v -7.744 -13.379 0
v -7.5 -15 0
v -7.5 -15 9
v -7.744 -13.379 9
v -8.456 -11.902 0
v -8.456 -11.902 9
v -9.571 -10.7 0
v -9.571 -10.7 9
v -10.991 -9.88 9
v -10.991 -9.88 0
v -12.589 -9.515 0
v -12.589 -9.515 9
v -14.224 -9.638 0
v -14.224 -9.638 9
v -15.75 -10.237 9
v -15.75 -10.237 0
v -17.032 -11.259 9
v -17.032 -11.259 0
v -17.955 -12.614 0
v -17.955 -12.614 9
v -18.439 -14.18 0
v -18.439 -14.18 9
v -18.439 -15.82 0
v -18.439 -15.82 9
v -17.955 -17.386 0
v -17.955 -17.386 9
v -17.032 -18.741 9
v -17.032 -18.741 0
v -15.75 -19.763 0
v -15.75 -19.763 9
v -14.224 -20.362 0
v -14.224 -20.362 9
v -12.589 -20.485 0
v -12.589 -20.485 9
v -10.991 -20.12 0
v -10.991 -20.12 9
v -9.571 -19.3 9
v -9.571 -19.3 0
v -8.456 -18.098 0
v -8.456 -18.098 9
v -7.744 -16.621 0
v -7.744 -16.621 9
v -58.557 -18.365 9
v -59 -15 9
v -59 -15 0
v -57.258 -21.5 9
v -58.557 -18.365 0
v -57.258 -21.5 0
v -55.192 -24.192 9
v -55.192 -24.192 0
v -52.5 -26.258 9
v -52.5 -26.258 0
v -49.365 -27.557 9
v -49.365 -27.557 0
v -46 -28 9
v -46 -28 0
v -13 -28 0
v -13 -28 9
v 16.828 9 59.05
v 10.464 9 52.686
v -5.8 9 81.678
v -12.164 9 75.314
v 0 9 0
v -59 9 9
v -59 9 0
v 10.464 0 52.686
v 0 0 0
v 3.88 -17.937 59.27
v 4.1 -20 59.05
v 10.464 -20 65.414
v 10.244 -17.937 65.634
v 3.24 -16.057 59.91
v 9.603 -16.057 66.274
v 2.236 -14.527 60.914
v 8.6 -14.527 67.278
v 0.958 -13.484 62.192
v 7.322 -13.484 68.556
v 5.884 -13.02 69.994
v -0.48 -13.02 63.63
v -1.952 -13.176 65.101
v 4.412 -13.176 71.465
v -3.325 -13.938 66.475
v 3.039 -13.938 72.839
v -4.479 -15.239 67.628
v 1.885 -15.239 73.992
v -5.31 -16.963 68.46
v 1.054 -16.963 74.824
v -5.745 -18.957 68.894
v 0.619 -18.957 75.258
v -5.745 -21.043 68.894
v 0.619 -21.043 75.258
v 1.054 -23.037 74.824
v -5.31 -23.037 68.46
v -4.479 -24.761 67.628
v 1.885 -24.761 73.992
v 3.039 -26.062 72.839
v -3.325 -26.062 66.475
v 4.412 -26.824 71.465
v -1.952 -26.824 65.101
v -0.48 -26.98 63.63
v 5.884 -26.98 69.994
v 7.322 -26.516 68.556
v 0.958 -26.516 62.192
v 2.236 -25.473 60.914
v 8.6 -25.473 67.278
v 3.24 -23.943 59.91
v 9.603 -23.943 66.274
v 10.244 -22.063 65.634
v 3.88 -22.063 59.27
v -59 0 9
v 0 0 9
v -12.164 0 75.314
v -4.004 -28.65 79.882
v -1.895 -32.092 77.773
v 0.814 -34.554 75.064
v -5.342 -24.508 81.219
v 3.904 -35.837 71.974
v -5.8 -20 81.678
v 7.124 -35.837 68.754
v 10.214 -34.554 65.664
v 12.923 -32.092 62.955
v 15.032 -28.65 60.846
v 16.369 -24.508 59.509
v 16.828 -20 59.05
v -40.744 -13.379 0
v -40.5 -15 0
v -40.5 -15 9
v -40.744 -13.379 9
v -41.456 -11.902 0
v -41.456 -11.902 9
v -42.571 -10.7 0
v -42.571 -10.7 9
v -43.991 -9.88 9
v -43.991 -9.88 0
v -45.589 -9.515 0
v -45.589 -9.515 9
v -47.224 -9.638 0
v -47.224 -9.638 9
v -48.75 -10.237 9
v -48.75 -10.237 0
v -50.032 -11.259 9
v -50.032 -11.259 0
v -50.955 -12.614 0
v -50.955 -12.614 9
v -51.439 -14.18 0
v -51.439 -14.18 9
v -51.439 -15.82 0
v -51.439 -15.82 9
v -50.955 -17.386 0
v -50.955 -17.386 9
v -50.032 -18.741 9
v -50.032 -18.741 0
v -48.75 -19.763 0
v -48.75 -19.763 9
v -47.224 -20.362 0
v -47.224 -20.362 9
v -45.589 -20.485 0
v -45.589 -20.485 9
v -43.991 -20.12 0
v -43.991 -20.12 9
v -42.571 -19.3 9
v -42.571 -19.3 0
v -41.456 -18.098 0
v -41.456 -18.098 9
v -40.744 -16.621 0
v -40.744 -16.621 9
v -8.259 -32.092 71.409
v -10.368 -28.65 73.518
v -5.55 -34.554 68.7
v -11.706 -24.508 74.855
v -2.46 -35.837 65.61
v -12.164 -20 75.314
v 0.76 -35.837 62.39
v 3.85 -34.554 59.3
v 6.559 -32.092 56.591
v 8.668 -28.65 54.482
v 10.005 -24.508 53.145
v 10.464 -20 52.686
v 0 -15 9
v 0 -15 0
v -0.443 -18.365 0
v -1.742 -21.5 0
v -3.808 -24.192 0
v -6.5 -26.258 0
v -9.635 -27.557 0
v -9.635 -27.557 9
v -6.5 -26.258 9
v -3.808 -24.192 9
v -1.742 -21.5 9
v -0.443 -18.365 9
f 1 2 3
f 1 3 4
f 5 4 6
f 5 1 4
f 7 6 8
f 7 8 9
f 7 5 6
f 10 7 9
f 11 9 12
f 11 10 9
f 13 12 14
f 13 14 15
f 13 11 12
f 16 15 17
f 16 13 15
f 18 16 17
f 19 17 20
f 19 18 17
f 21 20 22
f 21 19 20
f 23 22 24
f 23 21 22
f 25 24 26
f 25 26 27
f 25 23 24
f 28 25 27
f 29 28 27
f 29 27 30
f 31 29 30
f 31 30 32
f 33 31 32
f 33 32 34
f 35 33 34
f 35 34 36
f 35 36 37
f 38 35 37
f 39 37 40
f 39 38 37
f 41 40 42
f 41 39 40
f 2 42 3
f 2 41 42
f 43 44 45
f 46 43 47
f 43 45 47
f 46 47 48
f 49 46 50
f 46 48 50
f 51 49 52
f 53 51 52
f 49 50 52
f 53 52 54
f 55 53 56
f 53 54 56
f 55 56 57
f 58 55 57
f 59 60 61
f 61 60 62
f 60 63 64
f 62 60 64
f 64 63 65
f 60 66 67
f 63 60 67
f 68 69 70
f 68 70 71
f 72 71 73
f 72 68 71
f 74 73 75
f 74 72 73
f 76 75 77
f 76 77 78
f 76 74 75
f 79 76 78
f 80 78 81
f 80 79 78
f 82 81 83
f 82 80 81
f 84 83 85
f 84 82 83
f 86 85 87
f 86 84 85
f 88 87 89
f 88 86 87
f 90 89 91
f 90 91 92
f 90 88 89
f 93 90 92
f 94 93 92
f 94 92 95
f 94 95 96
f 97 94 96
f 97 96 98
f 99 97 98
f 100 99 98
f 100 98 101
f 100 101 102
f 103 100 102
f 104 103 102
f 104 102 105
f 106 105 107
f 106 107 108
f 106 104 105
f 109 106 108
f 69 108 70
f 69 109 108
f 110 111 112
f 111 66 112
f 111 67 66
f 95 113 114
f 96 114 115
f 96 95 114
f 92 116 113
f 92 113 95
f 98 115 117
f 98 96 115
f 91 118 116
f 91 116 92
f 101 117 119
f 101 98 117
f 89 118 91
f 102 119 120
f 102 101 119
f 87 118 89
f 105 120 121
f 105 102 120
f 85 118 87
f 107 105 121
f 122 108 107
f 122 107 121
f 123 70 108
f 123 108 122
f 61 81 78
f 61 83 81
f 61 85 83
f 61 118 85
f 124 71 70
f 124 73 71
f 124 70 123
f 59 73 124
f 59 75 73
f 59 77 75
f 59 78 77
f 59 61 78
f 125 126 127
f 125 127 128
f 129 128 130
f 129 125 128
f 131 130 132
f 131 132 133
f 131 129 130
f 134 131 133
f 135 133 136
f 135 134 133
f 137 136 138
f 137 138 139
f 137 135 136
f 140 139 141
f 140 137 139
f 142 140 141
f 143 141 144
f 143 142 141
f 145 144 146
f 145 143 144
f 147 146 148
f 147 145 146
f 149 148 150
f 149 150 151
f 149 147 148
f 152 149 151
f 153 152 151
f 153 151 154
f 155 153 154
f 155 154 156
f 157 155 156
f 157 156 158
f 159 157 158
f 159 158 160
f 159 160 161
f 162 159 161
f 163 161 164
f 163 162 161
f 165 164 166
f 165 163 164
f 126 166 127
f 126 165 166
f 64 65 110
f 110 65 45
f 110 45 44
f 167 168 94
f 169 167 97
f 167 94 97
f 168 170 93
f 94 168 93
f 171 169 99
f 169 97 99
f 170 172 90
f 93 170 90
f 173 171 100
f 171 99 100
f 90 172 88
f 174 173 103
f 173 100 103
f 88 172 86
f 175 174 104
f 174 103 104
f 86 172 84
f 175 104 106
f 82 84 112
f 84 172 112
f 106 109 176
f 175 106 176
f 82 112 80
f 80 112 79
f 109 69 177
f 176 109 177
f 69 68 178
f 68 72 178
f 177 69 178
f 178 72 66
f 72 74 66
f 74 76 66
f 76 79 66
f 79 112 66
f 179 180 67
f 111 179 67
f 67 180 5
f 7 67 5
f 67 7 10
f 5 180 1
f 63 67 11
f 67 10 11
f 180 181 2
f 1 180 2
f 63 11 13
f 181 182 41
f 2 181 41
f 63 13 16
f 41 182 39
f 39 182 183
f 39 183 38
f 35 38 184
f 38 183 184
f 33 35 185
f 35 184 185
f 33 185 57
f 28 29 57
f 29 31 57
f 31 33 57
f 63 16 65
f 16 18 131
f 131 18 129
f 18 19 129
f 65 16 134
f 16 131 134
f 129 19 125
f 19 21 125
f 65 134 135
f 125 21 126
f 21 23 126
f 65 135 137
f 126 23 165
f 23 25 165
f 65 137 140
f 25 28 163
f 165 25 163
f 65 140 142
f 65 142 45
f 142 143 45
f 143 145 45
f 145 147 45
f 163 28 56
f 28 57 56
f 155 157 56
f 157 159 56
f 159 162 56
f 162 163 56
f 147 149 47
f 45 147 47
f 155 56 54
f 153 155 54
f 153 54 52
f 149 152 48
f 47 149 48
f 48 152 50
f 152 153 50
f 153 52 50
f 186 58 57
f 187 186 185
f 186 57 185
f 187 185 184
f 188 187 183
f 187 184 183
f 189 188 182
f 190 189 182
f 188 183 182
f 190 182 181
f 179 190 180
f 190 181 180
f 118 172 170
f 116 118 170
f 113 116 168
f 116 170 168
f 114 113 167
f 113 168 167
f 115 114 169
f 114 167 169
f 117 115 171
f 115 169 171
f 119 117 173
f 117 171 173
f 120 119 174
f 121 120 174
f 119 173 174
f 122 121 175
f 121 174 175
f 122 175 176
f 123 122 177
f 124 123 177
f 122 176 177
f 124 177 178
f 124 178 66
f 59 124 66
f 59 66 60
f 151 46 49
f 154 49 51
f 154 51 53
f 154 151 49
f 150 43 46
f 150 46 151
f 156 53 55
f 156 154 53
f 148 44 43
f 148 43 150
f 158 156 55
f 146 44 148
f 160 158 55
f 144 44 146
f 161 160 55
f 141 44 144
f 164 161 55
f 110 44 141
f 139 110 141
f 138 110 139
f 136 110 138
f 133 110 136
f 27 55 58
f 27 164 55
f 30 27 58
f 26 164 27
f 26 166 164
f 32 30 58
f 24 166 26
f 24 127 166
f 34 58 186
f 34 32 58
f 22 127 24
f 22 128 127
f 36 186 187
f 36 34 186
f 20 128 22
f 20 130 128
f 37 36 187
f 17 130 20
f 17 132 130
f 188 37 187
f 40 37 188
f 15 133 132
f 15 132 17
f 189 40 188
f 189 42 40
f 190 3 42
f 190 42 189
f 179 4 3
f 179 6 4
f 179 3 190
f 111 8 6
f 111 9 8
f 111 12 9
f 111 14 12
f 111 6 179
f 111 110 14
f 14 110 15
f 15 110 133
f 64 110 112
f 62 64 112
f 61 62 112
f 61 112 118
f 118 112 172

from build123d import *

# Parameters (mm, degrees)
F0_R     = 5.5
F1_DEPTH = 9
F3_DEPTH = 9
F4_R     = 7
F5_DEPTH = 9


with BuildPart() as f1:
    # F0 (on Top) → F1 (new body)
    with BuildSketch(Plane.XY):
        with BuildLine():
            Line((0, -15), (0, 0))
            Line((0, 0), (-59, 0))
            Line((-59, 0), (-59, -15))
            ThreePointArc((-59, -15), (-55.192388, -24.192388), (-46, -28))
            Line((-46, -28), (-13, -28))
            ThreePointArc((-13, -28), (-3.807612, -24.192388), (0, -15))
        make_face()
        with Locations((-46, -15)):
            Circle(F0_R, mode=Mode.SUBTRACT)
        with Locations((-13, -15)):
            Circle(F0_R, mode=Mode.SUBTRACT)
    extrude(amount=F1_DEPTH)

    # F2 (on face) → F3 (join)
    with BuildSketch(Plane(origin=(0, 0, 0), x_dir=(-1, 0, 0), z_dir=(0, 1, 0))):
        Polygon((59, 0), (59, 9), (12.163848, 75.313708), (-10.463569, 52.686292), (0, 0), align=None)
    extrude(amount=F3_DEPTH)

    # F4 (on face) → F5 (join)
    with BuildSketch(Plane(origin=(31.57493, 0, 31.57493), x_dir=(0.707107, 0, -0.707107), z_dir=(0.707107, 0, 0.707107))):
        with BuildLine():
            Line((-29.855973, 9), (-61.855973, 9))
            Line((-61.855973, 9), (-61.855973, -20))
            ThreePointArc((-61.855973, -20), (-45.855973, -36), (-29.855973, -20))
            Line((-29.855973, -20), (-29.855973, 9))
        make_face()
        with Locations((-45.855973, -20)):
            Circle(F4_R, mode=Mode.SUBTRACT)
    extrude(amount=F5_DEPTH)


solid = f1.part
